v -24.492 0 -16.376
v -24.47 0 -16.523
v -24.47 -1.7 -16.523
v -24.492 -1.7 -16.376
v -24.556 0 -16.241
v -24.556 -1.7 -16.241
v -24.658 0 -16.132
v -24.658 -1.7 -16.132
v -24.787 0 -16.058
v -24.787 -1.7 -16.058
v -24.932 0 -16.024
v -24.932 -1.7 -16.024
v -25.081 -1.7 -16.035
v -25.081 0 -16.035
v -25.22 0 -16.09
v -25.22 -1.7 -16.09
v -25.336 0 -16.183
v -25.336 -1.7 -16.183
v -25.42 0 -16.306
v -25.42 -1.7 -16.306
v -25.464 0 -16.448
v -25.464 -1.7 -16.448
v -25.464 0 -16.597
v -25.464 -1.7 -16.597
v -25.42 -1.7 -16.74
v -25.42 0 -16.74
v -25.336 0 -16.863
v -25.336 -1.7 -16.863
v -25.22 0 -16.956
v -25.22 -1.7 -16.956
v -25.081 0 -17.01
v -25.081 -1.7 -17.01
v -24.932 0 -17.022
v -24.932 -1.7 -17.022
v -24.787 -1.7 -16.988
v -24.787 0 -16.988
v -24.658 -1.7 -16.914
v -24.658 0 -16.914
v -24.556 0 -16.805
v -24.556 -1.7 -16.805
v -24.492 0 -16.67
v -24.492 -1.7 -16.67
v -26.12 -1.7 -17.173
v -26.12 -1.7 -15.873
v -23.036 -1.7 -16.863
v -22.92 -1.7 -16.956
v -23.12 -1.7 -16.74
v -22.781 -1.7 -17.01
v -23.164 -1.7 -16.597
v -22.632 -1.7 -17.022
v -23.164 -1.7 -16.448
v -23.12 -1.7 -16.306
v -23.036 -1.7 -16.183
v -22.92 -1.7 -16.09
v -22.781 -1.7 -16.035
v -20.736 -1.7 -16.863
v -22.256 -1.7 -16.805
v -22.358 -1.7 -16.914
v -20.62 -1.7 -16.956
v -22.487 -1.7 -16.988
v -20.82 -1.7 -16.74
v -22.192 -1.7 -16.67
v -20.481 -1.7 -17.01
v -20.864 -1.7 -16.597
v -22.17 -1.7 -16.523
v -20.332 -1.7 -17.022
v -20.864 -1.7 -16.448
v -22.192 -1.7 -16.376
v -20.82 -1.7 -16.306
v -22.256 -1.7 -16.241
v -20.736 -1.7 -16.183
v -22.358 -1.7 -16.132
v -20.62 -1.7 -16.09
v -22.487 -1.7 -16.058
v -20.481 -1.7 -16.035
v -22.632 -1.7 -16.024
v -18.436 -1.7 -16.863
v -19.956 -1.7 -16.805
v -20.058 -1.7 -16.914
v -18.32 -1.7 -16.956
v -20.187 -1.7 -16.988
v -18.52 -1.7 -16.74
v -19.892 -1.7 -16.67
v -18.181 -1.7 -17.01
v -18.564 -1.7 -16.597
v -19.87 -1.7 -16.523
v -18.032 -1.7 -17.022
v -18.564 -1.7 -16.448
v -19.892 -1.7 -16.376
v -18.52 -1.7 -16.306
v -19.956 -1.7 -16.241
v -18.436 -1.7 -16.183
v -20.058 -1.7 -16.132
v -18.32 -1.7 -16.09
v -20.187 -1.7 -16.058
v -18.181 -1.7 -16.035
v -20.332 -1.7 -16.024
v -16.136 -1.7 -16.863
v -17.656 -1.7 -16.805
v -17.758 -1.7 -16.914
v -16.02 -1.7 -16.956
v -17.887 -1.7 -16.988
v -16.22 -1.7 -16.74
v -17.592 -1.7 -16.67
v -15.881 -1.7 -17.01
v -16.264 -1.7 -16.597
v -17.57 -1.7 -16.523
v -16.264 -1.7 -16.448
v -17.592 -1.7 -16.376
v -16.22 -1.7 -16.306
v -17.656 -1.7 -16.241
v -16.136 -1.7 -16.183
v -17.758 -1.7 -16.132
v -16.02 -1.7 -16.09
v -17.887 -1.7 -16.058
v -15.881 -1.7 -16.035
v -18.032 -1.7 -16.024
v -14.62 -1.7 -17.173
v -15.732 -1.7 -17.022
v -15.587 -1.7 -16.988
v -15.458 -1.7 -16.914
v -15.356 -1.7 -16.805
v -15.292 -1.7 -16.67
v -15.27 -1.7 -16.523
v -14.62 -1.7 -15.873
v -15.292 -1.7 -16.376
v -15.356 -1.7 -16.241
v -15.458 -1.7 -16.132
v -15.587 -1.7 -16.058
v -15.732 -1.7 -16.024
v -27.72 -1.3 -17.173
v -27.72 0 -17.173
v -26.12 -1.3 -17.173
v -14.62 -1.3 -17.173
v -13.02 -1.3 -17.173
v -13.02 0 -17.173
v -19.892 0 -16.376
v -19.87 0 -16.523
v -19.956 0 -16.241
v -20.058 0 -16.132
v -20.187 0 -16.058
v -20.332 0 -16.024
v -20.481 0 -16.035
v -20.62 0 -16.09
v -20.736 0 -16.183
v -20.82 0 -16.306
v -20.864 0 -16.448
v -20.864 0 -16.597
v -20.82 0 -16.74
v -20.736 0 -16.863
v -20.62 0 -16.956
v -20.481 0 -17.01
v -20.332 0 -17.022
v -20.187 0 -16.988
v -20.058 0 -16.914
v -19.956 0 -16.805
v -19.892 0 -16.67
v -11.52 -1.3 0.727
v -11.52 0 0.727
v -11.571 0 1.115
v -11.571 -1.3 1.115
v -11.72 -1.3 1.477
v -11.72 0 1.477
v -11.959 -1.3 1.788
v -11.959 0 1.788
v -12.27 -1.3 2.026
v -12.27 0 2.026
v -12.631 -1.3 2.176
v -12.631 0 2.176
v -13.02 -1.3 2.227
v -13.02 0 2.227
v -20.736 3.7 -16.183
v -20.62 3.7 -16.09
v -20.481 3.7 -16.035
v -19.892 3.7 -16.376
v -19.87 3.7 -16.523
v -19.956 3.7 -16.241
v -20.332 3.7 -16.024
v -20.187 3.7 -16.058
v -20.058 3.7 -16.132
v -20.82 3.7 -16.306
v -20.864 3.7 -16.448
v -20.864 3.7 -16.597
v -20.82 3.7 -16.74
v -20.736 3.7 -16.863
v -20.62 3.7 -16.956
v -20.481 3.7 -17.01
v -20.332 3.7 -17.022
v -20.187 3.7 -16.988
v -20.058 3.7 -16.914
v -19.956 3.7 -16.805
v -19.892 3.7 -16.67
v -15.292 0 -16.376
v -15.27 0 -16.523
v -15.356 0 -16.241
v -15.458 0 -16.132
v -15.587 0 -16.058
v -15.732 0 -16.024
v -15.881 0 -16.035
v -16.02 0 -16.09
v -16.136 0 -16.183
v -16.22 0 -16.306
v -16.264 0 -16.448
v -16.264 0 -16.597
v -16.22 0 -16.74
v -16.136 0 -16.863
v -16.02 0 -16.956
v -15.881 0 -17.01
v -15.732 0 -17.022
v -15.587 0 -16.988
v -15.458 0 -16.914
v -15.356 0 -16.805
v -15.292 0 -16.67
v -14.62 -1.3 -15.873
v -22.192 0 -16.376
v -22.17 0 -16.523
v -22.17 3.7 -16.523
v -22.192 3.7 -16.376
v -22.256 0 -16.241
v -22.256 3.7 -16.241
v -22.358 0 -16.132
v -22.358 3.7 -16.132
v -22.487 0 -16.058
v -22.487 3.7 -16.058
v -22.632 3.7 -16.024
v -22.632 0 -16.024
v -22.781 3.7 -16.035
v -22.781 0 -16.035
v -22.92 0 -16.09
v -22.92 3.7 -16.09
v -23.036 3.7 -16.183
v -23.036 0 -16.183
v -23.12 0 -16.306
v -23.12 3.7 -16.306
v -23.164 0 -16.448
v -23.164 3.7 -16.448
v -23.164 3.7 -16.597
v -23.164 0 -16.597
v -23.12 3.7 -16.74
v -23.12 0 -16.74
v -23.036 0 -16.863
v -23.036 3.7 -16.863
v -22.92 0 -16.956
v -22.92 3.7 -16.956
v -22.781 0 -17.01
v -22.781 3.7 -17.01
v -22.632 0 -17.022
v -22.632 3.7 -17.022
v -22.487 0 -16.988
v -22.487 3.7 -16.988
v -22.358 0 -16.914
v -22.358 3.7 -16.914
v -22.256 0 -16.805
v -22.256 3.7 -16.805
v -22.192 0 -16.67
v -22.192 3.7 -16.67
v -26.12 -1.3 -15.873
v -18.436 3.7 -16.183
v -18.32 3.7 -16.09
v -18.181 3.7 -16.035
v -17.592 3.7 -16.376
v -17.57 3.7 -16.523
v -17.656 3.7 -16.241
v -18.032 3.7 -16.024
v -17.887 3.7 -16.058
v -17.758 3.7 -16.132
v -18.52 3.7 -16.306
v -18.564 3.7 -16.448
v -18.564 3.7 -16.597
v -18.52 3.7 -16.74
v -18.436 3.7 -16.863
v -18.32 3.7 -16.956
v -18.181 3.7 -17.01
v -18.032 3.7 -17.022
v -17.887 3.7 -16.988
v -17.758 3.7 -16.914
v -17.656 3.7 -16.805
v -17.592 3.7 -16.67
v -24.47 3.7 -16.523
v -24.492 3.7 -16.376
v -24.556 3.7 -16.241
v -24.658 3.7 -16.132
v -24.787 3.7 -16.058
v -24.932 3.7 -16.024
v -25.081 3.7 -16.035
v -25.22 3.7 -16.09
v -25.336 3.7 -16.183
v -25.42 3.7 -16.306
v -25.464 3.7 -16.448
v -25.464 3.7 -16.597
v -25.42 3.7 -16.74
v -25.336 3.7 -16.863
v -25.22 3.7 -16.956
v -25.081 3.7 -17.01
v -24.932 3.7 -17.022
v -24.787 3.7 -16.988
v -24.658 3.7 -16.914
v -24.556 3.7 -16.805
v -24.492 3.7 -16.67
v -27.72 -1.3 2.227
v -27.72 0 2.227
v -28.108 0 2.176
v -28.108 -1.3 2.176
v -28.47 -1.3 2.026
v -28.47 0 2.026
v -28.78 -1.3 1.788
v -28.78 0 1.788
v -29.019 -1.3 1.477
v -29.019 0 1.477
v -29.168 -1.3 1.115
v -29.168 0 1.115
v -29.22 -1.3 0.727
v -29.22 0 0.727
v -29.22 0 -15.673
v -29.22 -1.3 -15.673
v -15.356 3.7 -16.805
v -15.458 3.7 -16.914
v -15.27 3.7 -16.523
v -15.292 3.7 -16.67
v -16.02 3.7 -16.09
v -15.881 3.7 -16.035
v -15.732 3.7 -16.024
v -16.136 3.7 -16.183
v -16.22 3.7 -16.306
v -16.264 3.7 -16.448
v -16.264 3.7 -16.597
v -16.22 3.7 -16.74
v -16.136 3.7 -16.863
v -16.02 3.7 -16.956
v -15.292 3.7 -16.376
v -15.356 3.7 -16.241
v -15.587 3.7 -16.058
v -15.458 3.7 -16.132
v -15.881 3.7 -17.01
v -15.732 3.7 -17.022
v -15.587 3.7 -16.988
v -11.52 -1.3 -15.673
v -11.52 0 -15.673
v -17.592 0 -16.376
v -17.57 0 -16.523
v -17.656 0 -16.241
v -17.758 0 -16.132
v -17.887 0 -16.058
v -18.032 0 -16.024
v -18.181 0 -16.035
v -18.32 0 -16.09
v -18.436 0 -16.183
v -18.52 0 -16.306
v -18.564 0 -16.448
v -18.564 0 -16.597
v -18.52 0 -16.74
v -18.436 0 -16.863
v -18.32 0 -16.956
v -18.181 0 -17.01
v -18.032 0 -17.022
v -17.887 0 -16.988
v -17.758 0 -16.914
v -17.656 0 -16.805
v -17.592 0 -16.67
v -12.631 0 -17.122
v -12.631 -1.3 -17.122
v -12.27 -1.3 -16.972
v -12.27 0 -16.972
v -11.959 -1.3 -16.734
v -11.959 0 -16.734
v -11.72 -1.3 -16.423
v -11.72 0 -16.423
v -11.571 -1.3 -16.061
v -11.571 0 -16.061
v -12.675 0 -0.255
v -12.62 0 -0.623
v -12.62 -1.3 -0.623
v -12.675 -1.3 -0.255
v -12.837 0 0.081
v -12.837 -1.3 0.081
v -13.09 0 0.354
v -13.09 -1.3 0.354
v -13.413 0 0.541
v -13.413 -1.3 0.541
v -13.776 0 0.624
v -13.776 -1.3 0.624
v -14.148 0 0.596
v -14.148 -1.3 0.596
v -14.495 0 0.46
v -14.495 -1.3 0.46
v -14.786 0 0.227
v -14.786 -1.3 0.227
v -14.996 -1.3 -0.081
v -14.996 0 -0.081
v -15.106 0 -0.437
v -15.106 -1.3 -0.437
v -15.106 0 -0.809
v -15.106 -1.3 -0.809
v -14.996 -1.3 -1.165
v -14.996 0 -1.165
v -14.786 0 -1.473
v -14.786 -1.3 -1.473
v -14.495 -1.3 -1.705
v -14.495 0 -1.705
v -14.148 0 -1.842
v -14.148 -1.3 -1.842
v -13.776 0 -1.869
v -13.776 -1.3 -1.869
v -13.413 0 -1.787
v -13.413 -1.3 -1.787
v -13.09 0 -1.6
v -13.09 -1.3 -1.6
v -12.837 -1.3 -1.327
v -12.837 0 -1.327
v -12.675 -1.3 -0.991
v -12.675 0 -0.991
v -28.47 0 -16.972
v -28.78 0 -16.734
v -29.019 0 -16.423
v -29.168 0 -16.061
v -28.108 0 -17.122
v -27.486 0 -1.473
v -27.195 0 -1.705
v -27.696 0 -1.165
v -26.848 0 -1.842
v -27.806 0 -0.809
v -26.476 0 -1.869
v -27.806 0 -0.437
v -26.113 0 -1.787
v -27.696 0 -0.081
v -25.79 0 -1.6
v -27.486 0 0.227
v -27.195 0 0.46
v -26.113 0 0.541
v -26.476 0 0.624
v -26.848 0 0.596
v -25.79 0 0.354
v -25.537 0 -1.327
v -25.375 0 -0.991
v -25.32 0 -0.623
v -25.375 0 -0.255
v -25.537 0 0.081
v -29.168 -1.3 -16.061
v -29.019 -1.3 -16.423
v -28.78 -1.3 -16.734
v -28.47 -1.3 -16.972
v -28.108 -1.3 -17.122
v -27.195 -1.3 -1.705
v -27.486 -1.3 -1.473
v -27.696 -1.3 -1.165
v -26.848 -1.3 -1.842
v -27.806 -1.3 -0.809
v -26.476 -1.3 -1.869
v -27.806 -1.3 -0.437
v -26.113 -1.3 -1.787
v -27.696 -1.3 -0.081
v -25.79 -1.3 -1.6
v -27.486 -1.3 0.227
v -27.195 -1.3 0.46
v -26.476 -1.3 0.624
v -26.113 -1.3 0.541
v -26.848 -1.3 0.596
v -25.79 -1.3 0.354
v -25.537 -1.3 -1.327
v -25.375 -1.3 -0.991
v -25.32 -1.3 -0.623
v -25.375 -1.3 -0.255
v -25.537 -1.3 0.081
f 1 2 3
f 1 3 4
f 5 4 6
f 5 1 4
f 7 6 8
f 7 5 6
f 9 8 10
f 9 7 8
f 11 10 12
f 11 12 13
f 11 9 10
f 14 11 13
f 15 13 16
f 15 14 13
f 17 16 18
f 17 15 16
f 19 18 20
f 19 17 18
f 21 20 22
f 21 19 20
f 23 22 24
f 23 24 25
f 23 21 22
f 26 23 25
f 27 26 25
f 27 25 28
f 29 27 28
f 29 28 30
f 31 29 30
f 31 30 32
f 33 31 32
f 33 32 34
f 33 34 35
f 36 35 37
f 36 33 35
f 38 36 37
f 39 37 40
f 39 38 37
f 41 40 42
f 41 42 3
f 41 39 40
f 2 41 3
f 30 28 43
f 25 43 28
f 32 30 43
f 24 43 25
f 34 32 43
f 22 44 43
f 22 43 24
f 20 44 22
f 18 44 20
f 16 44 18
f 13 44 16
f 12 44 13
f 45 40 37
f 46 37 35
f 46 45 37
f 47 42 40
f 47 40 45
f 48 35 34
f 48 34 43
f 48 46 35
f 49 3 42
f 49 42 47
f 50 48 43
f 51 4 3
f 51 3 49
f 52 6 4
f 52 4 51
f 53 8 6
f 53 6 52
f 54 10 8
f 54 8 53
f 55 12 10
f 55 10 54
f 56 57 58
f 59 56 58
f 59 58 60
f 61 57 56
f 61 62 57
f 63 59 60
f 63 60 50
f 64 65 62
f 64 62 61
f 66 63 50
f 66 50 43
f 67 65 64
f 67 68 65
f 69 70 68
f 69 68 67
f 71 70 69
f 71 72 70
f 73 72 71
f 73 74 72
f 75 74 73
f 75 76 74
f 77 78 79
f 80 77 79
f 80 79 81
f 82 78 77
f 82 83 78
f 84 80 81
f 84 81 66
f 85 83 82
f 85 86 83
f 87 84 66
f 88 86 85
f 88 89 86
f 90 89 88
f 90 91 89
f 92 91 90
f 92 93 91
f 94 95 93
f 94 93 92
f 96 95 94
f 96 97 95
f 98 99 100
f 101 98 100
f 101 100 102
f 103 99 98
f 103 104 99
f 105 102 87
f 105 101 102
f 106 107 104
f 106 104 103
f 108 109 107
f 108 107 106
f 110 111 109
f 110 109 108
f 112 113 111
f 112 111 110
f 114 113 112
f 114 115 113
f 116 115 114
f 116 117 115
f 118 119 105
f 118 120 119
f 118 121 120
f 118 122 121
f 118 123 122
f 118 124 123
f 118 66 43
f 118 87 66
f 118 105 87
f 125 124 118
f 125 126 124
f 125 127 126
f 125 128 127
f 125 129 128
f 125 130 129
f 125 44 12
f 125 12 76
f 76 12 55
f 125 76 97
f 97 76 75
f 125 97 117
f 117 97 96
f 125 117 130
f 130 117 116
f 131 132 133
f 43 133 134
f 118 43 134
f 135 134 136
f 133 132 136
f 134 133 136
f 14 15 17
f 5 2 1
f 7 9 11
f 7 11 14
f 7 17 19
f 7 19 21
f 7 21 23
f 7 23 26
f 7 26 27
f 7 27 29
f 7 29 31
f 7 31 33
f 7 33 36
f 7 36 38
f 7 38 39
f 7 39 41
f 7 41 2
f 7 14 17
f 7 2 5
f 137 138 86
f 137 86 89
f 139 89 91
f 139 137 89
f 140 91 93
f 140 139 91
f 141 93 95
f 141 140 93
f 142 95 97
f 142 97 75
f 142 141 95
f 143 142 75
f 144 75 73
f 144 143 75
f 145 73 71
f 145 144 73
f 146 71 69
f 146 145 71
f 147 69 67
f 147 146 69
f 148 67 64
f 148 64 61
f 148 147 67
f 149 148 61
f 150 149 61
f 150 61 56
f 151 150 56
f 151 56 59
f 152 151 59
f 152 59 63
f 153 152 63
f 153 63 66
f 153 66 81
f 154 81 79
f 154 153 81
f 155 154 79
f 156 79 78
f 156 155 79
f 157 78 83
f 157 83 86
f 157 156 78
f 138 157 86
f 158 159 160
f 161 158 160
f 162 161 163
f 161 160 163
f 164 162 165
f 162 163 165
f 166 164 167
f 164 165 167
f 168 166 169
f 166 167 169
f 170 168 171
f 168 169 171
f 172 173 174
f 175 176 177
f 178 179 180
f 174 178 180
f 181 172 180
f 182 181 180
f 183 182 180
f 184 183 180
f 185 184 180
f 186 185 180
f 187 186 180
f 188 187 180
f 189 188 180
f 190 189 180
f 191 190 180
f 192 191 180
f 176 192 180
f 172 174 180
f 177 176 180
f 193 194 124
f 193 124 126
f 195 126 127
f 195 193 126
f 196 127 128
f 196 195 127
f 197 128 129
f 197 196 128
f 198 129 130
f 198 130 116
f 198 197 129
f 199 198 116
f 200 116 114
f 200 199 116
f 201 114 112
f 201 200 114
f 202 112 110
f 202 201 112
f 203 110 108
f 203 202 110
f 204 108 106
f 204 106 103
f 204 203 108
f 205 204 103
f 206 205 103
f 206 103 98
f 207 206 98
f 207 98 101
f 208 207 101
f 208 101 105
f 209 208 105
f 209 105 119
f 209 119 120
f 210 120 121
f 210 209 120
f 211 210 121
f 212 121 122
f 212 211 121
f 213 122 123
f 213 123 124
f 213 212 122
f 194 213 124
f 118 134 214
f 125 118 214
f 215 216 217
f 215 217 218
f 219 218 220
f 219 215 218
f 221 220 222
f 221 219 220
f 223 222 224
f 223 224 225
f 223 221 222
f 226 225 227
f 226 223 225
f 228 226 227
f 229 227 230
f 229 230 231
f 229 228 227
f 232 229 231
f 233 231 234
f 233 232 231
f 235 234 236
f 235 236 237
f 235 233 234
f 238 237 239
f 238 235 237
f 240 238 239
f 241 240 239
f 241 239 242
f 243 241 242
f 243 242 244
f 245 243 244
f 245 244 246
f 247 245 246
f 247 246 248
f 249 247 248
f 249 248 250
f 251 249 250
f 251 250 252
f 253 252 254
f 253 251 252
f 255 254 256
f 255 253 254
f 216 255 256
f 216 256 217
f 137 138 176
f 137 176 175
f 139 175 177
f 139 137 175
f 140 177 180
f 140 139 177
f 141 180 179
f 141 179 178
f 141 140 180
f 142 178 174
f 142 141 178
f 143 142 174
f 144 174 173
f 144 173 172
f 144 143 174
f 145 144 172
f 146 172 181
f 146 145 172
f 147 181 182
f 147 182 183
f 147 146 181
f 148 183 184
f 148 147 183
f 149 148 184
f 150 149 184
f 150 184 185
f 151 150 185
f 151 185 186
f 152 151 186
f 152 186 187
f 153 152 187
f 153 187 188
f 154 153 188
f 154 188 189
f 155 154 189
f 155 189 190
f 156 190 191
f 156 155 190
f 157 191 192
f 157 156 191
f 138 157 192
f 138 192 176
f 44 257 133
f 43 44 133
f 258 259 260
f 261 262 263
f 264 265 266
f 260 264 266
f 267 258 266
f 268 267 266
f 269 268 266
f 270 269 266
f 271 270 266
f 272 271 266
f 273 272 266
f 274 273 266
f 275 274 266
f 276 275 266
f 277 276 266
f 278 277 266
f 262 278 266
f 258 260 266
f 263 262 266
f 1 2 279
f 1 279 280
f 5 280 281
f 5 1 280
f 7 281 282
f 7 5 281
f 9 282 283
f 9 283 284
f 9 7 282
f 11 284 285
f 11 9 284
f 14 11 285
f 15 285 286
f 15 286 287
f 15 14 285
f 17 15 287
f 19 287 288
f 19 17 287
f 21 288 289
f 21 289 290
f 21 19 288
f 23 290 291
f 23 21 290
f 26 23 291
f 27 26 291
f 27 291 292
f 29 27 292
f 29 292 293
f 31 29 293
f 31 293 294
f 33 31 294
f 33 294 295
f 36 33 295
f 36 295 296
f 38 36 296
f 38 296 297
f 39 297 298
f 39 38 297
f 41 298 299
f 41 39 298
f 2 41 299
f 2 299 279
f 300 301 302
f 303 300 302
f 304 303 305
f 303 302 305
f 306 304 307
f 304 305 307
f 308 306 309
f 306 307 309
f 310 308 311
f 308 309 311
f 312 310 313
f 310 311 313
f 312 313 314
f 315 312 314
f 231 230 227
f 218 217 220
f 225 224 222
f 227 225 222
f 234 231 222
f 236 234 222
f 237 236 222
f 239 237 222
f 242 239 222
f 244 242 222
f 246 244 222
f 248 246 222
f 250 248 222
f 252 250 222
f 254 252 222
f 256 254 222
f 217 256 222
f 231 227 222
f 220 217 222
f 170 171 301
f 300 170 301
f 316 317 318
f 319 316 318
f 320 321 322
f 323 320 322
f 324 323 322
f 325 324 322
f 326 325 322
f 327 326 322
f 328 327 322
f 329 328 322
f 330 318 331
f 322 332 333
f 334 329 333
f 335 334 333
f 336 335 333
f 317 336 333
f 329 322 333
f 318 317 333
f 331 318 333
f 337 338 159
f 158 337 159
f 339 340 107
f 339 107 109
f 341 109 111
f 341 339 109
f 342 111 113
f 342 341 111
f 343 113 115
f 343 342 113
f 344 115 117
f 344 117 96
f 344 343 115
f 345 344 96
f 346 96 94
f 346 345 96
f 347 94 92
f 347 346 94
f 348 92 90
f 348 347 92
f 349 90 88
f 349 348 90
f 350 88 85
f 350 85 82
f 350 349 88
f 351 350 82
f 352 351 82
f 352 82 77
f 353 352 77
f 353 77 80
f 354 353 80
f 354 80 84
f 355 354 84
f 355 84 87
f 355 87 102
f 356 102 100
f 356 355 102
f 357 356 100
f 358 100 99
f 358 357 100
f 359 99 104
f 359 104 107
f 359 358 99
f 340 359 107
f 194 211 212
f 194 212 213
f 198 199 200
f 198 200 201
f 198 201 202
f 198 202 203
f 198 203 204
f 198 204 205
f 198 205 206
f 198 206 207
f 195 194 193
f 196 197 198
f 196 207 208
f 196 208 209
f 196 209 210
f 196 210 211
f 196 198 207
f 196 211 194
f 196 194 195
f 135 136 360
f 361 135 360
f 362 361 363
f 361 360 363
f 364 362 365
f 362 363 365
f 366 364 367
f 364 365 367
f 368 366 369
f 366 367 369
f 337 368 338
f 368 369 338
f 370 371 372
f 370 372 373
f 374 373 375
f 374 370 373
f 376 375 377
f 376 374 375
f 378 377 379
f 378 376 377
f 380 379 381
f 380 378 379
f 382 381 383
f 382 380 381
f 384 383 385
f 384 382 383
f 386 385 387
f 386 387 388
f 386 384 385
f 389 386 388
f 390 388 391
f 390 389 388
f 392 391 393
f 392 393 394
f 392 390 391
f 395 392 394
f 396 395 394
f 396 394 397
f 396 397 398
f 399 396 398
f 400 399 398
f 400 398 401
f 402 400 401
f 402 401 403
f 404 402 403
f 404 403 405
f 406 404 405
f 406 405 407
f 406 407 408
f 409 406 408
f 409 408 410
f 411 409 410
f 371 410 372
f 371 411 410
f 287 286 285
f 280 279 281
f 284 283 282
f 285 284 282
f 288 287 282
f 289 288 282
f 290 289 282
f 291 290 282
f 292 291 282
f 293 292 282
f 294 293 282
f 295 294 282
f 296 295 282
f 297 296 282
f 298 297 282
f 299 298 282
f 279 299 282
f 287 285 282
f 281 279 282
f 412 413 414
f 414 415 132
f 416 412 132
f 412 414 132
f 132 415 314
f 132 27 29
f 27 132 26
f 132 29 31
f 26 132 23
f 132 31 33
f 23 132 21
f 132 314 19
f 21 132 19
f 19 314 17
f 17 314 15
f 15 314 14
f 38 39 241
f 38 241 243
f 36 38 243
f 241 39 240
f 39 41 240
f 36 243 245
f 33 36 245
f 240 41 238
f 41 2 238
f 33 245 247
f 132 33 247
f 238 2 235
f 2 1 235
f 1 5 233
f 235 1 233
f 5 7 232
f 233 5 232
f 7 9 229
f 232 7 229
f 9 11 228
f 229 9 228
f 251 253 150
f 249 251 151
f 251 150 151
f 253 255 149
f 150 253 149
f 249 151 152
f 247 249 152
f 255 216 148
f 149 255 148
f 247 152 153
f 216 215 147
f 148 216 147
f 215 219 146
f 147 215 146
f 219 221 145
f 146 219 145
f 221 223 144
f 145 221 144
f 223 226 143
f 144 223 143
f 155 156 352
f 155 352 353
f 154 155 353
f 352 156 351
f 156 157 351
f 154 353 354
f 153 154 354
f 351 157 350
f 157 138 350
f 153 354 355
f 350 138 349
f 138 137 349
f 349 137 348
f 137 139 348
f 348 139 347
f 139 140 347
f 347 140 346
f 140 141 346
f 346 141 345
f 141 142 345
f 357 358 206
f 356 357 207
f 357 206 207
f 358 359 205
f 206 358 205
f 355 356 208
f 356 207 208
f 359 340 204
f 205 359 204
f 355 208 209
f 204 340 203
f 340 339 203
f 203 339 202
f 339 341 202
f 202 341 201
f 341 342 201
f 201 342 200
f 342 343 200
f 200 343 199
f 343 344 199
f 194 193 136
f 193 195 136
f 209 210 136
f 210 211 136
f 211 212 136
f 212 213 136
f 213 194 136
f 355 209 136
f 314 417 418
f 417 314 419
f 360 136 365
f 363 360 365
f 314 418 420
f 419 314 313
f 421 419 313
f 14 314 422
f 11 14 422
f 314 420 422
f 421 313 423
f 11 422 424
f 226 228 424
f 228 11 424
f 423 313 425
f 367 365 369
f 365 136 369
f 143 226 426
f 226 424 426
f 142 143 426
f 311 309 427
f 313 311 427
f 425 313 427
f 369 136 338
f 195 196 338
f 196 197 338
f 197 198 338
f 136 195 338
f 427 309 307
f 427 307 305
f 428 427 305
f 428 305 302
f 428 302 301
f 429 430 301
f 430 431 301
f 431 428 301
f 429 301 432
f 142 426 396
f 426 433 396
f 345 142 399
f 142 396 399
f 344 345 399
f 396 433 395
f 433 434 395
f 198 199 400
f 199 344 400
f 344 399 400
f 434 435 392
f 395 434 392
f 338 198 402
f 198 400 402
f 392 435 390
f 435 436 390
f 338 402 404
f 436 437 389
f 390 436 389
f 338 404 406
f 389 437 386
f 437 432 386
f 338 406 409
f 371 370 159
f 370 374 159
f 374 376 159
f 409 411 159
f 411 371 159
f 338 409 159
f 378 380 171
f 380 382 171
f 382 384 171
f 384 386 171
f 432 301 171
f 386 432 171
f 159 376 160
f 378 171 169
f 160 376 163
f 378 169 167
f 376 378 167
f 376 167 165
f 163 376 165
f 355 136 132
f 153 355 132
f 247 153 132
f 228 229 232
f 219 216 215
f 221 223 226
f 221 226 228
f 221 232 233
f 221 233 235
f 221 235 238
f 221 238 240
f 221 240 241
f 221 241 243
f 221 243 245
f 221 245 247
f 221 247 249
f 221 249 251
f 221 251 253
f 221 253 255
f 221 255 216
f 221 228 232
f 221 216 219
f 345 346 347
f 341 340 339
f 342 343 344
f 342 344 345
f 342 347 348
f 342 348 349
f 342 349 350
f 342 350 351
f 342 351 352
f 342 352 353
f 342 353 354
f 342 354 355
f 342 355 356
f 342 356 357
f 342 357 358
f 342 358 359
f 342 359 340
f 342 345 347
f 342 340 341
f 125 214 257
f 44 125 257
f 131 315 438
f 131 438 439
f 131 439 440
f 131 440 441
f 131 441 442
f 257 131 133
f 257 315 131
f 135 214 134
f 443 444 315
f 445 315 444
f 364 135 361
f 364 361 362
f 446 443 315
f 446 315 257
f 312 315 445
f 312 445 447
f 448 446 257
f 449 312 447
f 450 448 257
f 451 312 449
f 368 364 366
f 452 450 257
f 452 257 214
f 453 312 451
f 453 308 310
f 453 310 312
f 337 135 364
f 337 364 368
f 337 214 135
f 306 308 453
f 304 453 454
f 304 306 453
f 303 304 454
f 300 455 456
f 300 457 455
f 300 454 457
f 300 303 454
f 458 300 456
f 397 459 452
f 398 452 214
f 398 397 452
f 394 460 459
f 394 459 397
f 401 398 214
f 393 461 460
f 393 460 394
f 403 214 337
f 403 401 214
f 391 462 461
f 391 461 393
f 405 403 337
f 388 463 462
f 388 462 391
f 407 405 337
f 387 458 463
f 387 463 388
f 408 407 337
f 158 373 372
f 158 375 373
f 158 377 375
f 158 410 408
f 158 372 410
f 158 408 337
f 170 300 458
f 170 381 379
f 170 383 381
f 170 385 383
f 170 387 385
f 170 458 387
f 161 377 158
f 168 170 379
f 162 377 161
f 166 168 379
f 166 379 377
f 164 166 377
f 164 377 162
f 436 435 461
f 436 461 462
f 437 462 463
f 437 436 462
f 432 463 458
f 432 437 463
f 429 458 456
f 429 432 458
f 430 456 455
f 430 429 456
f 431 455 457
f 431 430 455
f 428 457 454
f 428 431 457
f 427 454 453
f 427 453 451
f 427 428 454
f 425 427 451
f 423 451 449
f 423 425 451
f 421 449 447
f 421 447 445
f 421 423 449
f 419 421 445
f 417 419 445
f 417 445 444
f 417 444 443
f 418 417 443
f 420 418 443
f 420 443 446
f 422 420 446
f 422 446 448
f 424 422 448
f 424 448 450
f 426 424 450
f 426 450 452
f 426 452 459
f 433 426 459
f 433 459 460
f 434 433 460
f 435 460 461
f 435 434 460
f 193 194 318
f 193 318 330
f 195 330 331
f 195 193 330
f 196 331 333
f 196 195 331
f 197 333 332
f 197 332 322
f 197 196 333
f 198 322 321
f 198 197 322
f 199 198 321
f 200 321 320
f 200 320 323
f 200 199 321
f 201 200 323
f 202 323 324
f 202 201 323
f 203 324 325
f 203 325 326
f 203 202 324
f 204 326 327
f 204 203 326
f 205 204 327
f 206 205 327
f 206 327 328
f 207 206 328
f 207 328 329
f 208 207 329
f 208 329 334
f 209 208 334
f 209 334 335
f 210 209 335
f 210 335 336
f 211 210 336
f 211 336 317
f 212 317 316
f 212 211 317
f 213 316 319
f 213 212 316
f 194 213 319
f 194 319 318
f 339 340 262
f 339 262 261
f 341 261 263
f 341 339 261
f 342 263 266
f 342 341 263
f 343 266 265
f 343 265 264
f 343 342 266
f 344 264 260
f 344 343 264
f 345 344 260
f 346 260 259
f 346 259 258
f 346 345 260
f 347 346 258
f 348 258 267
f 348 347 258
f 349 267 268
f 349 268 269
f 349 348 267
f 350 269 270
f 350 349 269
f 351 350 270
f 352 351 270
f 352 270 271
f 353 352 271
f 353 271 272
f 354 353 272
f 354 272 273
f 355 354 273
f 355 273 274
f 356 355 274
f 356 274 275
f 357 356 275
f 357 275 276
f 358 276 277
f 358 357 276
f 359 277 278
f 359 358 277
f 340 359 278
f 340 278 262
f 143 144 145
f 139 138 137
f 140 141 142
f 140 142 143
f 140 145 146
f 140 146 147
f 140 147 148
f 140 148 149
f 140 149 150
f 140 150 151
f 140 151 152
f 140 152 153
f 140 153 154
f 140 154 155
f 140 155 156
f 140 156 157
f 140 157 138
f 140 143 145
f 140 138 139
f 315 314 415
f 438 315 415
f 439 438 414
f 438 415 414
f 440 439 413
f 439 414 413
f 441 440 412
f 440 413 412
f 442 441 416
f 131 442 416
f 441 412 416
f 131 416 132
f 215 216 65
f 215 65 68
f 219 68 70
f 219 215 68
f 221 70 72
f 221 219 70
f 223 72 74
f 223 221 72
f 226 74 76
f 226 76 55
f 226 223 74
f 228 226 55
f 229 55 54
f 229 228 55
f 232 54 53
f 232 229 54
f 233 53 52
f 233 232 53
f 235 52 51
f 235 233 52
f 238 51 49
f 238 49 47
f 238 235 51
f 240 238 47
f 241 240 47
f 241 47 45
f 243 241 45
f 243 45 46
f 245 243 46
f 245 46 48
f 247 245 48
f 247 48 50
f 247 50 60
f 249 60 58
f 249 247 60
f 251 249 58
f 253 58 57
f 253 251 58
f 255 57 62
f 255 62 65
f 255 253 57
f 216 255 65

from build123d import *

# Parameters (mm, degrees)
F0_R     = 1.25
F1_DEPTH = 1.3
F0_R_2   = 0.5
F2_DEPTH = 1.7
F3_DEPTH = 3.7


with BuildPart() as f1:
    # F0 (on Front) → F1 (new body)
    with BuildSketch(Plane.XZ):
        with BuildLine():
            ThreePointArc((-29.219525, -15.672949), (-28.780185, -16.73361), (-27.719525, -17.172949))
            Line((-27.719525, -17.172949), (-26.119525, -17.172949))
            Line((-26.119525, -17.172949), (-26.119525, -15.872949))
            Line((-26.119525, -15.872949), (-23.819525, -15.872949))
            Line((-23.819525, -15.872949), (-14.619525, -15.872949))
            Line((-14.619525, -15.872949), (-14.619525, -17.172949))
            Line((-14.619525, -17.172949), (-13.019525, -17.172949))
            ThreePointArc((-13.019525, -17.172949), (-11.958865, -16.73361), (-11.519525, -15.672949))
            Line((-11.519525, -15.672949), (-11.519525, 0.727051))
            ThreePointArc((-11.519525, 0.727051), (-11.958865, 1.787711), (-13.019525, 2.227051))
            Line((-13.019525, 2.227051), (-27.719525, 2.227051))
            ThreePointArc((-27.719525, 2.227051), (-28.780185, 1.787711), (-29.219525, 0.727051))
            Line((-29.219525, 0.727051), (-29.219525, -15.672949))
        make_face()
        with Locations((-26.569525, -0.622949)):
            Circle(F0_R, mode=Mode.SUBTRACT)
        with Locations((-13.869525, -0.622949)):
            Circle(F0_R, mode=Mode.SUBTRACT)
    extrude(amount=F1_DEPTH)

    # F0 (on Front) → F2 (join)
    with BuildSketch(Plane.XZ):
        Polygon((-26.119525, -15.872949), (-26.119525, -17.172949), (-14.619525, -17.172949), (-14.619525, -15.872949), (-23.819525, -15.872949), align=None)
        with Locations((-24.969525, -16.522949)):
            Circle(F0_R_2, mode=Mode.SUBTRACT)
        with Locations((-22.669525, -16.522949)):
            Circle(F0_R_2, mode=Mode.SUBTRACT)
        with Locations((-20.369525, -16.522949)):
            Circle(F0_R_2, mode=Mode.SUBTRACT)
        with Locations((-18.069525, -16.522949)):
            Circle(F0_R_2, mode=Mode.SUBTRACT)
        with Locations((-15.769525, -16.522949)):
            Circle(F0_R_2, mode=Mode.SUBTRACT)
    extrude(amount=F2_DEPTH)


with BuildPart() as f3:
    # F0 (on Front) → F3 (new body)
    with BuildSketch(Plane.XZ):
        with Locations((-24.969525, -16.522949)):
            Circle(F0_R_2)
        with Locations((-22.669525, -16.522949)):
            Circle(F0_R_2)
        with Locations((-20.369525, -16.522949)):
            Circle(F0_R_2)
        with Locations((-18.069525, -16.522949)):
            Circle(F0_R_2)
        with Locations((-15.769525, -16.522949)):
            Circle(F0_R_2)
    extrude(amount=-F3_DEPTH)


solid = Compound([f1.part, f3.part])
